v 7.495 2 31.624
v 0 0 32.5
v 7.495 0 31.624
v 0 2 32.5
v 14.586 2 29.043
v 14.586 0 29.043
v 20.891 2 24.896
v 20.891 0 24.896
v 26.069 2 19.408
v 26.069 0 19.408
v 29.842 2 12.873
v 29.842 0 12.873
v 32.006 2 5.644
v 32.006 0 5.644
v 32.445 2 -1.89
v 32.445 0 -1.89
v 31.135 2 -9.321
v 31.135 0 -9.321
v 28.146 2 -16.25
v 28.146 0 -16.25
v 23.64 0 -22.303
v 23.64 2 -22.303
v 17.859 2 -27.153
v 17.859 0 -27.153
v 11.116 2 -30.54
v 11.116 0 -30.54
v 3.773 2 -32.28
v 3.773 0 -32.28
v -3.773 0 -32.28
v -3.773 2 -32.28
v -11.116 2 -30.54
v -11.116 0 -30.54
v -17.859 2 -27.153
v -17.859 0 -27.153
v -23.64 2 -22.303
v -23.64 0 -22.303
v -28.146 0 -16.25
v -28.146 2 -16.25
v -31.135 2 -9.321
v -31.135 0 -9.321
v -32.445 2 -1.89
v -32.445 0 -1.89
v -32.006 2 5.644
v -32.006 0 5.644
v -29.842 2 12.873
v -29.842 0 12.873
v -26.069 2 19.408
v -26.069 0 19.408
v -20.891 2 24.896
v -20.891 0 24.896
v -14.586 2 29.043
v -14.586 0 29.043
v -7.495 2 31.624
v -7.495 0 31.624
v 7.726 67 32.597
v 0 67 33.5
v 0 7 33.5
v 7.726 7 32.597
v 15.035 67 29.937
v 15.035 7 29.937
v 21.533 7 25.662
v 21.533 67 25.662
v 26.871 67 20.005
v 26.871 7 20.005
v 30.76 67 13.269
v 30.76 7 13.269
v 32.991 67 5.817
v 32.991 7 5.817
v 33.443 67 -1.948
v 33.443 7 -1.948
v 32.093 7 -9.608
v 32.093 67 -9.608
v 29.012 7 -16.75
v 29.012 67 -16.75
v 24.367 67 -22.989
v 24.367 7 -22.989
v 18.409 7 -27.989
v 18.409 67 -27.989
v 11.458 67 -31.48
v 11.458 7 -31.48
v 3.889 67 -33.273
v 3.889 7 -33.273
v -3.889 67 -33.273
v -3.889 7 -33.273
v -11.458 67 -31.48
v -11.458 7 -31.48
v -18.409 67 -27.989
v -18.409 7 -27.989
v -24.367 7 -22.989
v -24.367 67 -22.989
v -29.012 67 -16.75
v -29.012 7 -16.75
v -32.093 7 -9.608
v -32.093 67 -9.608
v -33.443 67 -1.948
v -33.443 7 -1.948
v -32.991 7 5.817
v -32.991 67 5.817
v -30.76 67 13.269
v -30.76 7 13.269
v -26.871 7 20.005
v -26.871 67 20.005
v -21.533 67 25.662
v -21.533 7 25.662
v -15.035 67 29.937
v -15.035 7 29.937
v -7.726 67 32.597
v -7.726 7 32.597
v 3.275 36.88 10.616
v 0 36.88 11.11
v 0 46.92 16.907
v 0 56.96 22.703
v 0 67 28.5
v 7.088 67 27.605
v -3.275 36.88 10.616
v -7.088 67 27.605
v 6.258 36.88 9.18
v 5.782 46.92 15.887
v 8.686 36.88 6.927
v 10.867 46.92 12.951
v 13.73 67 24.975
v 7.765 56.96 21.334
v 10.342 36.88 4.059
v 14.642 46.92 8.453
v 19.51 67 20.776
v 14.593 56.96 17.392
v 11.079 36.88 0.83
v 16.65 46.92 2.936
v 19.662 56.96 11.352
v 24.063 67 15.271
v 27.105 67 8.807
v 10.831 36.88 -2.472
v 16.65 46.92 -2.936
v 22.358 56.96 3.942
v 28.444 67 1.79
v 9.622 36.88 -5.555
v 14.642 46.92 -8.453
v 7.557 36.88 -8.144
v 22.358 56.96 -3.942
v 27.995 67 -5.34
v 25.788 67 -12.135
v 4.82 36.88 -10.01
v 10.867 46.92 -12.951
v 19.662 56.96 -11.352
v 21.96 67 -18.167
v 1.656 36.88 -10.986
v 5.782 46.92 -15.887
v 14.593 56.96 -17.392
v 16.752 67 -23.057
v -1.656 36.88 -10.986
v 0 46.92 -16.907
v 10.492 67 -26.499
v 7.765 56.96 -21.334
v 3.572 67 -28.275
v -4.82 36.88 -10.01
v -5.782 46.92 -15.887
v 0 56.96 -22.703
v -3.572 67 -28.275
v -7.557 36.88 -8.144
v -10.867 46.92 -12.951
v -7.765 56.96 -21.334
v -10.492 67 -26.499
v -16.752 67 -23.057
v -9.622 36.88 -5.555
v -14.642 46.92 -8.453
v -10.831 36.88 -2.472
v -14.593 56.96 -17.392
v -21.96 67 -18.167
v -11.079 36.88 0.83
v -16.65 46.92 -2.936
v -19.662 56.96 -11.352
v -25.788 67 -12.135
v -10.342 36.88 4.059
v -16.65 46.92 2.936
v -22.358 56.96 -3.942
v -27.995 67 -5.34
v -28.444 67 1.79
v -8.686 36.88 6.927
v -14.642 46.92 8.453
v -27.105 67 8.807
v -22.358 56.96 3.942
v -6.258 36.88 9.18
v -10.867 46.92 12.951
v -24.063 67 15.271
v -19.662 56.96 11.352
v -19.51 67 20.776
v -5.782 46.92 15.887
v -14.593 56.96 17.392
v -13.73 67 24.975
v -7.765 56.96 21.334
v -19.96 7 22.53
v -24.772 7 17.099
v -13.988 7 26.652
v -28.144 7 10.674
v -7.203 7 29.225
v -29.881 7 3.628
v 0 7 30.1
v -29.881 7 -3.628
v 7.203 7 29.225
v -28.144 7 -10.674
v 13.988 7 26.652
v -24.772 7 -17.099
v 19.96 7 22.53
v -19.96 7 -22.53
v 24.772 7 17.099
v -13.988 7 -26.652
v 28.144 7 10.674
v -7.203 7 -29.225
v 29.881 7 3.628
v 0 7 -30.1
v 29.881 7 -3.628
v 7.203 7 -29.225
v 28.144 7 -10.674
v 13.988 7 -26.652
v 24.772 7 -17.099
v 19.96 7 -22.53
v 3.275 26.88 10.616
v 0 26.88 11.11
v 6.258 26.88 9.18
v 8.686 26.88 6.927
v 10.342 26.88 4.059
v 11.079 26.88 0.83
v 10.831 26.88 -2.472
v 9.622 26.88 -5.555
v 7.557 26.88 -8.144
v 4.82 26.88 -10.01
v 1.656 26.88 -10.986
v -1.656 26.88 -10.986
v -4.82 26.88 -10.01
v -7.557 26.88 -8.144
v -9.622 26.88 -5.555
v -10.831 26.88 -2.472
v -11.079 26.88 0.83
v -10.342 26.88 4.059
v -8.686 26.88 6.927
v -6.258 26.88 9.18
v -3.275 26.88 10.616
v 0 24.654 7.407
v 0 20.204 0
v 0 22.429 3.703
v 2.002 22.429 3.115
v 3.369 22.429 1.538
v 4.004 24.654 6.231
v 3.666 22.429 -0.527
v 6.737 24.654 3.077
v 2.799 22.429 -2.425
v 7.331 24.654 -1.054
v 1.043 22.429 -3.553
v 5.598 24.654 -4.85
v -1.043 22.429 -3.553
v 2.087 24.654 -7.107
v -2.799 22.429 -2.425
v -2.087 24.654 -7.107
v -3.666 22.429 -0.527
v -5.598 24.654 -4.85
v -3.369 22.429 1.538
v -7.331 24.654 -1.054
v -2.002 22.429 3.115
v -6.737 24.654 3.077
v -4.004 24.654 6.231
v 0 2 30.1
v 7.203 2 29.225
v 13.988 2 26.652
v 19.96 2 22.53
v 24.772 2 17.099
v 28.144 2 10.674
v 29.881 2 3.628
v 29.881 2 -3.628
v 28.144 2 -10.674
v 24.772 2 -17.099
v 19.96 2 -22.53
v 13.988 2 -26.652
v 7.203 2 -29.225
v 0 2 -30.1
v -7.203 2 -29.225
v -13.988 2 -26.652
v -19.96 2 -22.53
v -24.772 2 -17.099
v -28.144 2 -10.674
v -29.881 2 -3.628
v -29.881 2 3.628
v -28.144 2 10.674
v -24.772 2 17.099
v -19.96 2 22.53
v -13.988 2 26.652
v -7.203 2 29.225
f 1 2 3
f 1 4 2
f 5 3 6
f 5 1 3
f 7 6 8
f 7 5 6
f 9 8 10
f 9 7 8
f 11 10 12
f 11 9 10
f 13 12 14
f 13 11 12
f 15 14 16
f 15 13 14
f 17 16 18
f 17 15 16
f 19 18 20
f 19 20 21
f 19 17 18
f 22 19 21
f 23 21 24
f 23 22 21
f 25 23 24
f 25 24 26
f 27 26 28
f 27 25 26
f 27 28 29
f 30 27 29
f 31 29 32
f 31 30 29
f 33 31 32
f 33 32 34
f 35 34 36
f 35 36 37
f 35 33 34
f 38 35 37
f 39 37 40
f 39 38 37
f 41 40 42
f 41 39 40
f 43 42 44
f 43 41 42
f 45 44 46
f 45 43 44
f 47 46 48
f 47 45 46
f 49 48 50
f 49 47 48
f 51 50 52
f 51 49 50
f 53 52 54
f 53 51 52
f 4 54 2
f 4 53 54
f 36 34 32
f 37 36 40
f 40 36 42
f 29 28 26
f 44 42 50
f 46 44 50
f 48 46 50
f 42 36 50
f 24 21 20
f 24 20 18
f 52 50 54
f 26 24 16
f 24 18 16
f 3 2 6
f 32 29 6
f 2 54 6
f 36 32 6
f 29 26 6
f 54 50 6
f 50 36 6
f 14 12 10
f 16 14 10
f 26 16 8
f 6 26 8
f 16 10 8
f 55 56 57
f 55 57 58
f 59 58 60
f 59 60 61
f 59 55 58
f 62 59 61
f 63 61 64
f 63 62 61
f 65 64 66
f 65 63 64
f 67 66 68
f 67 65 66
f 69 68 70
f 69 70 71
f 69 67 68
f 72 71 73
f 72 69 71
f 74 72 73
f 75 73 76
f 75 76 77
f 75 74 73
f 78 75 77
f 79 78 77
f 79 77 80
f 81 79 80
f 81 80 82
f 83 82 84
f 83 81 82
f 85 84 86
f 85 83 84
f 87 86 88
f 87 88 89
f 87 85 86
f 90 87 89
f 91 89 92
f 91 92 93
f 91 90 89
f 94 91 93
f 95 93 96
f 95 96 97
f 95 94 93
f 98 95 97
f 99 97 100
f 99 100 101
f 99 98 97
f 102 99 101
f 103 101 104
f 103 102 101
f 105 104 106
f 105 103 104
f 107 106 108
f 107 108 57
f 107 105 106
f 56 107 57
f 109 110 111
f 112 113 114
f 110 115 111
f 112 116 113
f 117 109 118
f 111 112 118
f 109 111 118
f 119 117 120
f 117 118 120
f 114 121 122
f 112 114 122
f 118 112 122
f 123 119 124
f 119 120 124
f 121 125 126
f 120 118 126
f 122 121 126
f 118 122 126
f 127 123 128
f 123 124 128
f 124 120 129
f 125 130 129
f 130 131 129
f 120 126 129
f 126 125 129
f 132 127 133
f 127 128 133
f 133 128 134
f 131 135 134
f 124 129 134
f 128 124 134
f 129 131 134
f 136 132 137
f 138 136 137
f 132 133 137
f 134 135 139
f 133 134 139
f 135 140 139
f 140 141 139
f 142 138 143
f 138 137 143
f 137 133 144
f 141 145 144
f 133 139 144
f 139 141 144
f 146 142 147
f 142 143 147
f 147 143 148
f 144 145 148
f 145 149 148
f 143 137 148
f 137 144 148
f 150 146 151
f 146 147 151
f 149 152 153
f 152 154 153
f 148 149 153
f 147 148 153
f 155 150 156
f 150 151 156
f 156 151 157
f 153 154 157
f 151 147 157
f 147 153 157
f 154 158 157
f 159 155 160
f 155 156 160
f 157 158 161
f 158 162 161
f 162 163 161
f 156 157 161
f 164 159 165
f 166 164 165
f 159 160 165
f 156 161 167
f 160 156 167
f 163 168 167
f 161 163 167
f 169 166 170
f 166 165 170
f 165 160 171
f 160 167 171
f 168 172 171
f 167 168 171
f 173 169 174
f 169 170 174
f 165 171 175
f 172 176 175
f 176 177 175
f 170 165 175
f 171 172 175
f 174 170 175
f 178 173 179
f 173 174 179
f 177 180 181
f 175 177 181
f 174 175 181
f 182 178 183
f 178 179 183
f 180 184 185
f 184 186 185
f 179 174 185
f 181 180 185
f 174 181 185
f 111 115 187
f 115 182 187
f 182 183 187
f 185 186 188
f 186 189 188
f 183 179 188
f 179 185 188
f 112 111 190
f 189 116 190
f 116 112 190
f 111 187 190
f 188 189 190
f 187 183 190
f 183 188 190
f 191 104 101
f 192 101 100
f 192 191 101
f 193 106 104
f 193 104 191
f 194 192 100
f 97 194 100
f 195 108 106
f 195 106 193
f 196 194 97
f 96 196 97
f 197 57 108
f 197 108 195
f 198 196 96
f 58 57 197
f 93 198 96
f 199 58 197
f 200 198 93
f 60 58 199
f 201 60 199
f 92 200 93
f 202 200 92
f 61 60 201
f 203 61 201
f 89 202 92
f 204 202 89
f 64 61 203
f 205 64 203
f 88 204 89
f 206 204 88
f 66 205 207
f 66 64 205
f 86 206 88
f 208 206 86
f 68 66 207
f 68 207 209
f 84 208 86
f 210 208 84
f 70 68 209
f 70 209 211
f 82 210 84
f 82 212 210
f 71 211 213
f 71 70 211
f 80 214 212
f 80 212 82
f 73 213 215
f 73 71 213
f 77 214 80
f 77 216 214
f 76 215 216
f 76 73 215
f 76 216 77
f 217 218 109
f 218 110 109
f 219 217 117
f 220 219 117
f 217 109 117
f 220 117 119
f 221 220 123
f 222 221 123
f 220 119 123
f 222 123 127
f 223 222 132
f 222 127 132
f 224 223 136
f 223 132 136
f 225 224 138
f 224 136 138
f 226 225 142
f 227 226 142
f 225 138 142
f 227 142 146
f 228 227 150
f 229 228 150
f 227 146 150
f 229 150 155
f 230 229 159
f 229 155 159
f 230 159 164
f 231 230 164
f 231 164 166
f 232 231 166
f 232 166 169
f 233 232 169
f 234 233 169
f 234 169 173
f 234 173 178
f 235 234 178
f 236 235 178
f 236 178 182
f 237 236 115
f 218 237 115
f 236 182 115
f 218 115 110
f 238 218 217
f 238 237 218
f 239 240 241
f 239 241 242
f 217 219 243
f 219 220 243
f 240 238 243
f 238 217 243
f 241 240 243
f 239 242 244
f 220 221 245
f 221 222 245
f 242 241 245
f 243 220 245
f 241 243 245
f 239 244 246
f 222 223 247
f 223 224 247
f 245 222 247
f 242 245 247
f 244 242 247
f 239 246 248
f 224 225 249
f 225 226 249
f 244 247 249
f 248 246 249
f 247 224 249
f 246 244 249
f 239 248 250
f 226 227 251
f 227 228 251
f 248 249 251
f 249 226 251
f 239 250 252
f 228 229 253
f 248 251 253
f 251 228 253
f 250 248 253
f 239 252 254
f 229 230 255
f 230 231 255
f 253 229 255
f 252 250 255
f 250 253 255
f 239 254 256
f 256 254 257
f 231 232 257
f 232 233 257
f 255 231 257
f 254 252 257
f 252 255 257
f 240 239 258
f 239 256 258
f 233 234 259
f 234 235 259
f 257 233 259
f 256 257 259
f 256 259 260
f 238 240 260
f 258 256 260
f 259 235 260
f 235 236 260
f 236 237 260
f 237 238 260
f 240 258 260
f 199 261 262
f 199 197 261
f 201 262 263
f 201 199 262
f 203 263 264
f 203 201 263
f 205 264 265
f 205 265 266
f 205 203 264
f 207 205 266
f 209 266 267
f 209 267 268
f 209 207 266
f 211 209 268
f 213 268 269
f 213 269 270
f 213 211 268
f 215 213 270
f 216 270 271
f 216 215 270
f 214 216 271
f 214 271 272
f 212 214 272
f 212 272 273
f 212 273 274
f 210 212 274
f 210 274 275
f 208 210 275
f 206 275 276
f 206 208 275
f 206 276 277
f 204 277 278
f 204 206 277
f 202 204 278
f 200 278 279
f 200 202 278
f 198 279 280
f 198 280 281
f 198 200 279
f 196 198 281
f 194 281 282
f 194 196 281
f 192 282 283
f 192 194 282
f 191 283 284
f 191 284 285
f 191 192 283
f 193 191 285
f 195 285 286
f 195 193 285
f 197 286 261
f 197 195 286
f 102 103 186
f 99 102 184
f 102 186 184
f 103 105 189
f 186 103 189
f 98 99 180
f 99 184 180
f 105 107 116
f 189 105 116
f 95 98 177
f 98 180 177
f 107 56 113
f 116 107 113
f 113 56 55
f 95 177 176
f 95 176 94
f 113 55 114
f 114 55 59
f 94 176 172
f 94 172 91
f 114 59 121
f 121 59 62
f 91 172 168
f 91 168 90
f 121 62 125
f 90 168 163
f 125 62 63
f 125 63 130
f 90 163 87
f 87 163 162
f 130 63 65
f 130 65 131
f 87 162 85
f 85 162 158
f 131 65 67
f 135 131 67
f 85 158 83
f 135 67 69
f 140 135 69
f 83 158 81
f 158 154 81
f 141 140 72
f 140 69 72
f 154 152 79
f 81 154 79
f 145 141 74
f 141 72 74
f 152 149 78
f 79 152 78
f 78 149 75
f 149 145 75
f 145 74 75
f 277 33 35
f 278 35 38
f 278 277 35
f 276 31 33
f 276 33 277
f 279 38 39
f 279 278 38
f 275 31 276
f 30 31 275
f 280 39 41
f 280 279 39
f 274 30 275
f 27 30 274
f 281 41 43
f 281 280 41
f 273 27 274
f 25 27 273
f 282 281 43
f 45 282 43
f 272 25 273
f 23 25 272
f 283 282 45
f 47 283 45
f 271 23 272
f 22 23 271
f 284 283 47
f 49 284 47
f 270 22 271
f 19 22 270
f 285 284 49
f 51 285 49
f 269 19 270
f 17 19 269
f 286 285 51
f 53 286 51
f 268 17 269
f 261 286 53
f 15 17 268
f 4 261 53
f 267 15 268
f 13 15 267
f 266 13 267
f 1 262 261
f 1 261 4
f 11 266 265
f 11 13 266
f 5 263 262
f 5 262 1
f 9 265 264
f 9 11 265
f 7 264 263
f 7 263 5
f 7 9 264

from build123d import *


with BuildPart() as f2:
    # F1 (on face) → F2 (revolve)
    with BuildSketch(Plane.YZ):
        Polygon((0, 35), (0, 0), (20.204075, 0), (26.879636, 11.11), (36.879636, 11.11), (67, 28.5), (67, 35), align=None)
    revolve(axis=Axis((0, 35.295283, 0), (0, 1, 0)))

    # F3 (on Right) → F4 (revolve, cut)
    with BuildSketch(Plane.YZ):
        Polygon((7, 33.5), (68.52591, 33.5), (69.647816, 44.953279), (0, 44.953279), (0, 32.5), (2, 32.5), (2, 30.1), (7, 30.1), align=None)
    revolve(axis=Axis((0, 56.397552, 0), (0, 1, 0)), mode=Mode.SUBTRACT)


solid = f2.part
